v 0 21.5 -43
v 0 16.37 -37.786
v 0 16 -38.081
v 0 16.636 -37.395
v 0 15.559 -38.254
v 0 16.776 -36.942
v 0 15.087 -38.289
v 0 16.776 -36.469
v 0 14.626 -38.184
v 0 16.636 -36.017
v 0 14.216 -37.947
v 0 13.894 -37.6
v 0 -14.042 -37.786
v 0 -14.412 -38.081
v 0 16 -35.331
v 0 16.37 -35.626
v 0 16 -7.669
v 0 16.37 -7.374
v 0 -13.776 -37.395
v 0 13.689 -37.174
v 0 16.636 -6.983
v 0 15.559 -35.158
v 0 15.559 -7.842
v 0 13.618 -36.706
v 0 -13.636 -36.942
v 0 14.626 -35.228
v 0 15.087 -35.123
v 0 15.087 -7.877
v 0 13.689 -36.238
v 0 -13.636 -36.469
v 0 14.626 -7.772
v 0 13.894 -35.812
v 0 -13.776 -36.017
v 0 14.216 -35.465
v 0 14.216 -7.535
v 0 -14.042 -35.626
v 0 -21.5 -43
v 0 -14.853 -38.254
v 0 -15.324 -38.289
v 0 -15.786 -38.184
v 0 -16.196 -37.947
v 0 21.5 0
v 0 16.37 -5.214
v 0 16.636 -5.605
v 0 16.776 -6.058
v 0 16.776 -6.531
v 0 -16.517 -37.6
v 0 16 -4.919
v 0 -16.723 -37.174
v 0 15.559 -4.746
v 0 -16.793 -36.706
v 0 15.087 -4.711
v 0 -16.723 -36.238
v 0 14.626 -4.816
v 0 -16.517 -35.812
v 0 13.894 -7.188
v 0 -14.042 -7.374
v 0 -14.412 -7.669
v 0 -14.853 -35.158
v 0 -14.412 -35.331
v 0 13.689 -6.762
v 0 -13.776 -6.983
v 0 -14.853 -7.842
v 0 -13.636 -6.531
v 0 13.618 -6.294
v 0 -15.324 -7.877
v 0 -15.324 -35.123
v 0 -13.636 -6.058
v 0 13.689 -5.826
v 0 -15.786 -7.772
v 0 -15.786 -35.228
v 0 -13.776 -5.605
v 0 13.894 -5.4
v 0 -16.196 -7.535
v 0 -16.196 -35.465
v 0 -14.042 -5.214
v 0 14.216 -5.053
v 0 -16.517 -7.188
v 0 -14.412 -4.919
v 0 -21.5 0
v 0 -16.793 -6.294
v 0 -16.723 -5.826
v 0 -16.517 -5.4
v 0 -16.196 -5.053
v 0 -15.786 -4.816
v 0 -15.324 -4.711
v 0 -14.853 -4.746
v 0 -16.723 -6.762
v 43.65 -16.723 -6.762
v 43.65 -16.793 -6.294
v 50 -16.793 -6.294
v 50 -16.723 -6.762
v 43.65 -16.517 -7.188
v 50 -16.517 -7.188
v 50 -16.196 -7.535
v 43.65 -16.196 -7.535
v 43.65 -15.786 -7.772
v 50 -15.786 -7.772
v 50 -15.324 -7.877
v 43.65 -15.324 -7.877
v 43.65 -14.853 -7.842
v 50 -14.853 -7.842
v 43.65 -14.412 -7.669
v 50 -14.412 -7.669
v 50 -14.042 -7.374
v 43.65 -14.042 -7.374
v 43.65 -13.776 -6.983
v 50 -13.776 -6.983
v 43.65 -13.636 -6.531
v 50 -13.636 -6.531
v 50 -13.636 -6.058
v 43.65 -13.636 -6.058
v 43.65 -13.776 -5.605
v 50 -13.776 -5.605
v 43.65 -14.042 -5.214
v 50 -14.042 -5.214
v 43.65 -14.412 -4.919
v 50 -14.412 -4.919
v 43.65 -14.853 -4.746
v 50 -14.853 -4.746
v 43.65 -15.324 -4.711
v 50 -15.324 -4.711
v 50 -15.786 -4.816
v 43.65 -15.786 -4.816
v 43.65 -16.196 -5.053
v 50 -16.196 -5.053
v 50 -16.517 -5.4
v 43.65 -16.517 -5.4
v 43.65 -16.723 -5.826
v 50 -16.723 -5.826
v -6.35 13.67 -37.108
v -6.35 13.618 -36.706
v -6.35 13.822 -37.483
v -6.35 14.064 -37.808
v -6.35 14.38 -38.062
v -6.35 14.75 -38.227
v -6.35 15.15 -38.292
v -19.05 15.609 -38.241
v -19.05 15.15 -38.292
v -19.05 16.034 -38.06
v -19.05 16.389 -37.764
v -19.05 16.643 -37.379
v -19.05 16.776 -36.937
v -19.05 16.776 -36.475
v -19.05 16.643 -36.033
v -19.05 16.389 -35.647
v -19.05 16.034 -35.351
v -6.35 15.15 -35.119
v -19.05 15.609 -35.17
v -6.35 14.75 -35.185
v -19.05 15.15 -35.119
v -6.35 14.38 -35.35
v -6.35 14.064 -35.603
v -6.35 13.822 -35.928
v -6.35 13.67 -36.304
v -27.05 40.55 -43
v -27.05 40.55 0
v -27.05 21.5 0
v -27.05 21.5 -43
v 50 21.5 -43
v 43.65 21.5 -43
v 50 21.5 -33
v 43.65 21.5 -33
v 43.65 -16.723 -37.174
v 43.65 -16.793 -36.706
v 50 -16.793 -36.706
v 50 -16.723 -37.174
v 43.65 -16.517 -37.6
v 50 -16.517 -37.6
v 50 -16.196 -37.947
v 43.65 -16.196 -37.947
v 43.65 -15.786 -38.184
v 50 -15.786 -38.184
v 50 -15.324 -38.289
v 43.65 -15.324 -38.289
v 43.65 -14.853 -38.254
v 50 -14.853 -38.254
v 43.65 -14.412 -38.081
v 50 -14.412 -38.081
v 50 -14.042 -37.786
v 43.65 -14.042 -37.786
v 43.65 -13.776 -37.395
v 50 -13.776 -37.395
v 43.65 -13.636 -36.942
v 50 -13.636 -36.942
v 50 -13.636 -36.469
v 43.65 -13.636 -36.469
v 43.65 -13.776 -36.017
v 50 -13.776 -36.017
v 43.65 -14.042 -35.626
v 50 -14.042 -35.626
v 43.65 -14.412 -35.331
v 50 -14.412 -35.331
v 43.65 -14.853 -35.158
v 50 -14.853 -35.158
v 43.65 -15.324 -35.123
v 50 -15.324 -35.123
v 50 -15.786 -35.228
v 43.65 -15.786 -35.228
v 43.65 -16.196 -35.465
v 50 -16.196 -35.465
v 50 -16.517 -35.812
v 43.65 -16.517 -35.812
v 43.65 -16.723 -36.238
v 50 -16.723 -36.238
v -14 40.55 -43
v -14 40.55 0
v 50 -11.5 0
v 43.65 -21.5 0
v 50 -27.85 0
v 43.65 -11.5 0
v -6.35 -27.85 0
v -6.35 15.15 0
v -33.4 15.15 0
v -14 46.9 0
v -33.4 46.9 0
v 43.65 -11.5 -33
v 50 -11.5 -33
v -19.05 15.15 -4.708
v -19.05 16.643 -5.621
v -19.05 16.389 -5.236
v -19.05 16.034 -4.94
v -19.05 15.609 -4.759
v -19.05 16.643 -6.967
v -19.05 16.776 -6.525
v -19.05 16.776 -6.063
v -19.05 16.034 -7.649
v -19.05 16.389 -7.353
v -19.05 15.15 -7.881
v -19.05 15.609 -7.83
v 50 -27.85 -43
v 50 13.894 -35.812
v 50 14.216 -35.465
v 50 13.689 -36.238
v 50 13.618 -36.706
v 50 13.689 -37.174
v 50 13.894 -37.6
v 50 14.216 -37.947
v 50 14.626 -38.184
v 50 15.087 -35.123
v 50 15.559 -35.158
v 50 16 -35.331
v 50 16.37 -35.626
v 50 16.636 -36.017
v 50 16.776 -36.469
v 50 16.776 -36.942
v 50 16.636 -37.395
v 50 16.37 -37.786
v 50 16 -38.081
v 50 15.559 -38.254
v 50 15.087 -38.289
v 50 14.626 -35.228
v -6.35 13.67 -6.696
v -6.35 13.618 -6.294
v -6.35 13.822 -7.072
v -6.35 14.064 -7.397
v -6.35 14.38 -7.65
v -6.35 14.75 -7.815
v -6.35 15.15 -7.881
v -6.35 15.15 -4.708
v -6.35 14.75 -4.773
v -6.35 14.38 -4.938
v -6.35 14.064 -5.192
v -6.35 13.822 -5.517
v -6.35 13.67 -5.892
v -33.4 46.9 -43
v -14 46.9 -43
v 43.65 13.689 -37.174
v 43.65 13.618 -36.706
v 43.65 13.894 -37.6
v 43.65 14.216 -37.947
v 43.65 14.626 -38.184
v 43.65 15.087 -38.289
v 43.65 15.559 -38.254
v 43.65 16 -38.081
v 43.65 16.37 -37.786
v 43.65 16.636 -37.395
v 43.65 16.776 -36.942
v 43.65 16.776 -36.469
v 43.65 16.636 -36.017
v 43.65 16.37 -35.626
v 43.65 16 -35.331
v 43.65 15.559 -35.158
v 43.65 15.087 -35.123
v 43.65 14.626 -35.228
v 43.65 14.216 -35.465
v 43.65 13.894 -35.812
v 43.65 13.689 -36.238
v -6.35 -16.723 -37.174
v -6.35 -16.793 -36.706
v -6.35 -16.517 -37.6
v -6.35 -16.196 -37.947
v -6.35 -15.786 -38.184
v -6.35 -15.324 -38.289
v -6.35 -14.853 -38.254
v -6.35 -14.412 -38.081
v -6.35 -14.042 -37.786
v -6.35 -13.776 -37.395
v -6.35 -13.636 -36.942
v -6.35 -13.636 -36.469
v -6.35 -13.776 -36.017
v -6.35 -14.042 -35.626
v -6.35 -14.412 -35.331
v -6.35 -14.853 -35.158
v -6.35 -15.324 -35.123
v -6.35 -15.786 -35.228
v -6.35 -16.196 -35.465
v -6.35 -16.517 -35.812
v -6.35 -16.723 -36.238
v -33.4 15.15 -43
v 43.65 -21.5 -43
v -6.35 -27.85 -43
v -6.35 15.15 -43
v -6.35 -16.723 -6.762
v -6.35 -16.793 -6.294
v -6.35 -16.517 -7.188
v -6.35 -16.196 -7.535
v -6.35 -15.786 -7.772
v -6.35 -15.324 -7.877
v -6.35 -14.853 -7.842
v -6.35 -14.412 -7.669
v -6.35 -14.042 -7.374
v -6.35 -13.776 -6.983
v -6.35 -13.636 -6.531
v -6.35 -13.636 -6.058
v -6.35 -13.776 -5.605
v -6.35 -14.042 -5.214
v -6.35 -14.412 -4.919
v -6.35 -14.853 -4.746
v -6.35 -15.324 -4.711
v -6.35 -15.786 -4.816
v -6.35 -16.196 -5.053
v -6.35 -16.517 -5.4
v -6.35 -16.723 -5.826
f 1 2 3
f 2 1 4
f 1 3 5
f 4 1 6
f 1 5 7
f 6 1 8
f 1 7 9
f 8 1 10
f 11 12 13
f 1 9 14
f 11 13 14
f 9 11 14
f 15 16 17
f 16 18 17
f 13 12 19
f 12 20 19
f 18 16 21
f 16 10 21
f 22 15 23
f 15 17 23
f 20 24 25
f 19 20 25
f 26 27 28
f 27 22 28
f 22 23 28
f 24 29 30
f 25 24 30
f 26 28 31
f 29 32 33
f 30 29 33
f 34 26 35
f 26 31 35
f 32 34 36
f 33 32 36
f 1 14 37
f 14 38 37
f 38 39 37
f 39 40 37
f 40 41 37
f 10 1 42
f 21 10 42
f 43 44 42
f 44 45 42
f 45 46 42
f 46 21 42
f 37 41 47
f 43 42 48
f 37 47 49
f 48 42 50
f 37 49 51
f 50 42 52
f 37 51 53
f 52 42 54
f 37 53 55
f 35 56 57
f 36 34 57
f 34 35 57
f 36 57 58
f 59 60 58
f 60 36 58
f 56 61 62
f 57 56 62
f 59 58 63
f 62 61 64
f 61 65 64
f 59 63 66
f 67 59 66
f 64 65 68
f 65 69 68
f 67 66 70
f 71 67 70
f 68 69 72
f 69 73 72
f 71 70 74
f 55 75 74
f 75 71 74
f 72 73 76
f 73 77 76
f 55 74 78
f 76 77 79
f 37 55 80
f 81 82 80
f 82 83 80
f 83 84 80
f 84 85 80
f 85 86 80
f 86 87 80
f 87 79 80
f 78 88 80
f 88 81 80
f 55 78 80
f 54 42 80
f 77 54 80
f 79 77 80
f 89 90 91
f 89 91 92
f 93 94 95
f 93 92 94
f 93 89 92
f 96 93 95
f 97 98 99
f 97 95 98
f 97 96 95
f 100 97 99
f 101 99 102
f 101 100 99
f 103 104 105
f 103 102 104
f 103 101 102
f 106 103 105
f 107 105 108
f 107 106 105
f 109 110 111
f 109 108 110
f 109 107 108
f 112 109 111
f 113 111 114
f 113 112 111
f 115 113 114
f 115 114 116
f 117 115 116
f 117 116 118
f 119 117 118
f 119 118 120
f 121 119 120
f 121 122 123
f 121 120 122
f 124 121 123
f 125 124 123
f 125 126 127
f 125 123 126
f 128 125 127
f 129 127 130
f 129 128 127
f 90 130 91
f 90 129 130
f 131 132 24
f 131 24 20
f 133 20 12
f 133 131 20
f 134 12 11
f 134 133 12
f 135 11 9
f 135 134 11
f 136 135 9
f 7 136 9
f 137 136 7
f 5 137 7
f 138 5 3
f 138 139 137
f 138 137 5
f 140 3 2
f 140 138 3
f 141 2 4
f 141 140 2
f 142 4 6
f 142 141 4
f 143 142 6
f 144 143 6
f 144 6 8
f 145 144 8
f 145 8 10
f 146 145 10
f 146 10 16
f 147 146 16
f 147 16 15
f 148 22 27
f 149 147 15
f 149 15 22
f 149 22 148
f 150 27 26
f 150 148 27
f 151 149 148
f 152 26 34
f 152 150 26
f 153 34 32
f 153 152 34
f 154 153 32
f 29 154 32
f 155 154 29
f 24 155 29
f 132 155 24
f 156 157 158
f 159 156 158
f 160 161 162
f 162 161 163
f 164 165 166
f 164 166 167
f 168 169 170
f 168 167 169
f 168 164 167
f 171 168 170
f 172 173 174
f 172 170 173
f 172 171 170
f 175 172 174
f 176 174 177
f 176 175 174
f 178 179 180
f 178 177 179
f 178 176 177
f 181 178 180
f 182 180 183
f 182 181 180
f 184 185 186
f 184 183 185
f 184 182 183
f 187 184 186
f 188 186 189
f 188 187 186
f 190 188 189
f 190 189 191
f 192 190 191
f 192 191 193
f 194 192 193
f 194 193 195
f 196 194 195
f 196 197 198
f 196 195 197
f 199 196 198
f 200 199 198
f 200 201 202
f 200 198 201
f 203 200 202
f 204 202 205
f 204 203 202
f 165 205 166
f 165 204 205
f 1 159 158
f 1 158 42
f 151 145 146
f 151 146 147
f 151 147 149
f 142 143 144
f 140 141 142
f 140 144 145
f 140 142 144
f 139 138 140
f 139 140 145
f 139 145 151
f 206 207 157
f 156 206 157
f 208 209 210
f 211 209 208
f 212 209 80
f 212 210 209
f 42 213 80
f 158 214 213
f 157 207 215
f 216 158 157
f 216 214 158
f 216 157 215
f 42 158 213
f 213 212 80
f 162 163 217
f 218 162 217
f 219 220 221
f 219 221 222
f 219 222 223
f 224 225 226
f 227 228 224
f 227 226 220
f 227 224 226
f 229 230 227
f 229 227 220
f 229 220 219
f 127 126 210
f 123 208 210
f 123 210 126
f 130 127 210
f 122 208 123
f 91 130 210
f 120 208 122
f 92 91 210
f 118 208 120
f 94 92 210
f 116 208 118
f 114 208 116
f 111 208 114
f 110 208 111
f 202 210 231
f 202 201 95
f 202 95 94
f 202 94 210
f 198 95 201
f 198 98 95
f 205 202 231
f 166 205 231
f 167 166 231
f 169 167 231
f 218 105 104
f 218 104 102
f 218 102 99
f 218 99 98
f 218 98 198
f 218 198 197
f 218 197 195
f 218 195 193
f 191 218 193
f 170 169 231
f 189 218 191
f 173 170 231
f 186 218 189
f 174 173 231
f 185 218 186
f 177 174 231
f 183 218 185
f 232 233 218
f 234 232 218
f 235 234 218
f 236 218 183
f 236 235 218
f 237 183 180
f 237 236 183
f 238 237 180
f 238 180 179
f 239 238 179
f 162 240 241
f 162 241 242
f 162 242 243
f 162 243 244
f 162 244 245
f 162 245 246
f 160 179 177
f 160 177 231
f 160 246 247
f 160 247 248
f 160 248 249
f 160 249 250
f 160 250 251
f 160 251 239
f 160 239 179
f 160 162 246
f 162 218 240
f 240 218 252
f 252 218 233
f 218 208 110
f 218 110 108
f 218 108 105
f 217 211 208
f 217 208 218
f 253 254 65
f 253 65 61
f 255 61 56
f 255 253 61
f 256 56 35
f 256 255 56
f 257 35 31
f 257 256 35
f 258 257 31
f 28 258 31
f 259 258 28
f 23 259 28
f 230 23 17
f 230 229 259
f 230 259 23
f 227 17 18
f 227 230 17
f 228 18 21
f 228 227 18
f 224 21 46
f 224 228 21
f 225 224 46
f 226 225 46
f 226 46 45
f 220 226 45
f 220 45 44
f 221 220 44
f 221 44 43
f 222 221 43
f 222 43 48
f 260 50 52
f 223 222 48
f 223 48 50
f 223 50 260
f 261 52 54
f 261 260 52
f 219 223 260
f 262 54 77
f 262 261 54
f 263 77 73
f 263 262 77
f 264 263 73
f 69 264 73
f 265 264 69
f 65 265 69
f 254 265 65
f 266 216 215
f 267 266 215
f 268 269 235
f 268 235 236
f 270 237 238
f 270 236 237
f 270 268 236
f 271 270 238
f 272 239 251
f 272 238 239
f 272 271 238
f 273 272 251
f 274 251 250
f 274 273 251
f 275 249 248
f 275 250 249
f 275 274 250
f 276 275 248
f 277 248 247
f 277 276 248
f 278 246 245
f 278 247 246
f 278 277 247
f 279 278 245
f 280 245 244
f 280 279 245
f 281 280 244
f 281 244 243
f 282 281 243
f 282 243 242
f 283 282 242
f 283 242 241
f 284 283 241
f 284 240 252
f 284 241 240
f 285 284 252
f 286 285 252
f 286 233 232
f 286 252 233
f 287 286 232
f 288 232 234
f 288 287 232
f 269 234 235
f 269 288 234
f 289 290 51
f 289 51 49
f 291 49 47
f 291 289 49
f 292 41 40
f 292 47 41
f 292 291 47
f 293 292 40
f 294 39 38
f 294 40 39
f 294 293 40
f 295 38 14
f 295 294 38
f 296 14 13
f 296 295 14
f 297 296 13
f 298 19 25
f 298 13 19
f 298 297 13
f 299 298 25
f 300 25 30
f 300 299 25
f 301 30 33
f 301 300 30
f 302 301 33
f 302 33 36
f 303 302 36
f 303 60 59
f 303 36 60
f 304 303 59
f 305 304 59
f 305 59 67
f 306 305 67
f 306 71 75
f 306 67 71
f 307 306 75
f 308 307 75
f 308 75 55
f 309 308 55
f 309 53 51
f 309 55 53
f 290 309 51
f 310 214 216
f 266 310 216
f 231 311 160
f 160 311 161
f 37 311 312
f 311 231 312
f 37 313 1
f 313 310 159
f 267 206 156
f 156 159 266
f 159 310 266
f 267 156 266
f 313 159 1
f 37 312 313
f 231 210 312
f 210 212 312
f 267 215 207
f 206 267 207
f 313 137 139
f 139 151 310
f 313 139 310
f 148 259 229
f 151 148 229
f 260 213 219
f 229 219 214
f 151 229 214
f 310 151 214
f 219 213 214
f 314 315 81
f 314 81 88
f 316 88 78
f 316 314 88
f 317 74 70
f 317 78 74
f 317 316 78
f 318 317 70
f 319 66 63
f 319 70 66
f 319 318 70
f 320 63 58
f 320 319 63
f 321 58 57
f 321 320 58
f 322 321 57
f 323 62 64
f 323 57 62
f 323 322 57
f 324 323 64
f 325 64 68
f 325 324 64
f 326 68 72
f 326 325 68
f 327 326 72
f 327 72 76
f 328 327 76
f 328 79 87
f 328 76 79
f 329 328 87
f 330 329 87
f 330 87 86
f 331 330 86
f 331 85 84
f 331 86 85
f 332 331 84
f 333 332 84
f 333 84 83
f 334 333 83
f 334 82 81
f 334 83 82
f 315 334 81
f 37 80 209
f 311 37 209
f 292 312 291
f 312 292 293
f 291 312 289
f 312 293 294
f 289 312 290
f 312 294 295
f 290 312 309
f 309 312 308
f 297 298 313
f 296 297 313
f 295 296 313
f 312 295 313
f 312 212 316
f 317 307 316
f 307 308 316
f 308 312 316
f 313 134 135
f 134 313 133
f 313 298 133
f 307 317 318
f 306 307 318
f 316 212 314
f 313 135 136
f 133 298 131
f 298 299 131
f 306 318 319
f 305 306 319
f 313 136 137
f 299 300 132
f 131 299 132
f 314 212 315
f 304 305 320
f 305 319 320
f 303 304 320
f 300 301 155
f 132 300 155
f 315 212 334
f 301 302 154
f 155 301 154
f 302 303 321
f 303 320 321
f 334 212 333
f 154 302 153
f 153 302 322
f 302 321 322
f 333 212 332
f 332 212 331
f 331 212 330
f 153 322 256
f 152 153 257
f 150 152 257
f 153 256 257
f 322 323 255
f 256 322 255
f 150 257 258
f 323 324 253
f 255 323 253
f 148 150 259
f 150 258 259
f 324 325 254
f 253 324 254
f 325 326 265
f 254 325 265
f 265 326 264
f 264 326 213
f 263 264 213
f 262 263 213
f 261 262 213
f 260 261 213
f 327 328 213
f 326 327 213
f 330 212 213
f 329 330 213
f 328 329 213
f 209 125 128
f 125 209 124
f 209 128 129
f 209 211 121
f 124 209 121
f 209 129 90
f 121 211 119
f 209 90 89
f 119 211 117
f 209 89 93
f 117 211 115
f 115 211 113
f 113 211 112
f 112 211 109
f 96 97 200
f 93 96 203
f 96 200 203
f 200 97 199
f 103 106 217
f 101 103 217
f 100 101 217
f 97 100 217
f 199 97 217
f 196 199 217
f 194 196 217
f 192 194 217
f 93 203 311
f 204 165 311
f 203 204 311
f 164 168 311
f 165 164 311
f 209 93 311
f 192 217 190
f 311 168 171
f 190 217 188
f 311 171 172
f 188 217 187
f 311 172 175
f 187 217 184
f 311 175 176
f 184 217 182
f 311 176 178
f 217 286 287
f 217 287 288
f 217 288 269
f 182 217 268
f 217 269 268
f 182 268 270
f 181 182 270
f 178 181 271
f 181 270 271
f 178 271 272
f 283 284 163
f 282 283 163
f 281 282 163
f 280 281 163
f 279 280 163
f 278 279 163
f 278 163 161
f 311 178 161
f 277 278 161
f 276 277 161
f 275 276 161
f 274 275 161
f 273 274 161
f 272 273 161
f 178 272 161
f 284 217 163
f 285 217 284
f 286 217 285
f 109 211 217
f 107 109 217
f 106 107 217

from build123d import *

# Parameters (mm, degrees)
BOSS_EXTRUDE1_DEPTH     = 43
SKETCH2_W               = 33
SKETCH2_H               = 6.35
SKETCH2_H_2             = 10
SKETCH2_R               = 1.5
SKETCH2_W_2             = 10
BOSS_EXTRUDE2_DEPTH     = 6.35
CUT_EXTRUDE1_DEPTH      = 85.993720356
CUT_EXTRUDE1_DEPTH_BACK = 12.7
SKETCH3_R               = 1.5875


with BuildPart() as part:
    # Sketch1 → Boss-Extrude1 (new body)
    with BuildSketch(Plane.XY):
        Polygon((-6.35, -27.85), (-6.35, 15.15), (-33.4, 15.15), (-33.4, 46.9), (-14, 46.9), (-14, 40.55), (-27.05, 40.55), (-27.05, 21.5), (0, 21.5), (0, -21.5), (43.65, -21.5), (43.65, -27.85), align=None)
    extrude(amount=-BOSS_EXTRUDE1_DEPTH)

    # Sketch2 → Boss-Extrude2 (add)
    # profile 1 of 4: a face of its own
    with BuildSketch(Plane(origin=(43.65, 0, 0), x_dir=(0, 0, -1), z_dir=(1, 0, 0))):
        with Locations((16.5, -24.675)):
            Rectangle(SKETCH2_W, SKETCH2_H)
    # profile 2 of 4: a face of its own
    with BuildSketch(Plane(origin=(43.65, 0, 0), x_dir=(0, 0, -1), z_dir=(1, 0, 0))):
        with Locations((16.5, -16.5)):
            Rectangle(SKETCH2_W, SKETCH2_H_2)
        with Locations((6.294174233, -15.205825767)):
            Circle(SKETCH2_R, mode=Mode.SUBTRACT)
    # profile 3 of 4: a face of its own
    with BuildSketch(Plane(origin=(43.65, 0, 0), x_dir=(0, 0, -1), z_dir=(1, 0, 0))):
        with Locations((38, -24.675)):
            Rectangle(SKETCH2_W_2, SKETCH2_H)
    # profile 4 of 4: a face of its own
    with BuildSketch(Plane(origin=(43.65, 0, 0), x_dir=(0, 0, -1), z_dir=(1, 0, 0))):
        Polygon((33, -11.5), (33, -21.5), (43, -21.5), (43, 21.5), (33, 21.5), align=None)
        with Locations((36.705825767, -15.205825767)):
            Circle(SKETCH2_R, mode=Mode.SUBTRACT)
        with Locations((36.705825767, 15.205825767)):
            Circle(SKETCH2_R, mode=Mode.SUBTRACT)
    extrude(amount=BOSS_EXTRUDE2_DEPTH)

    # Sketch3 → Cut-Extrude1 (cut, two sides: drawn at the far end of the back side and taken through both)
    with BuildSketch(Plane(origin=(-6.35, 0, 0), x_dir=(0, 0, -1), z_dir=(1, 0, 0)).offset(-CUT_EXTRUDE1_DEPTH_BACK)):
        with Locations(Location((6.294174233, -15.205825767, 0), (0, 0, 270))):
            Circle(SKETCH3_R)
        with Locations(Location((6.294174233, 15.205825767, 0), (0, 0, 270))):
            Circle(SKETCH3_R)
        with Locations(Location((36.705825767, 15.205825767, 0), (0, 0, 270))):
            Circle(SKETCH3_R)
        with Locations(Location((36.705825767, -15.205825767, 0), (0, 0, 270))):
            Circle(SKETCH3_R)
    extrude(amount=CUT_EXTRUDE1_DEPTH + CUT_EXTRUDE1_DEPTH_BACK, mode=Mode.SUBTRACT)


solid = part.part
